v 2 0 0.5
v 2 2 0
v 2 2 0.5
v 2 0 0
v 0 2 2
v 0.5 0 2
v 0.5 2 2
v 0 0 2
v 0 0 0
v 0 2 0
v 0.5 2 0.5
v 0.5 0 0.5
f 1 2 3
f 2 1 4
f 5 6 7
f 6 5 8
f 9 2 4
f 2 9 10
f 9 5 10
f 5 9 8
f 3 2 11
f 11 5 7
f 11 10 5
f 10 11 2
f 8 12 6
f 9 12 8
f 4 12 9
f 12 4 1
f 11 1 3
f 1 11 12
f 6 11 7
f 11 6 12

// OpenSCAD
difference() {
  scale([2.0000000000, 2.0000000000, 2.0000000000]) {
    cube([1, 1, 1]);
  }
  translate([0.5000000000, 0.0000000000, 0.5000000000]) {
    scale([2.0000000000, 2.0000000000, 2.0000000000]) {
      cube([1, 1, 1]);
    }
  }
}
